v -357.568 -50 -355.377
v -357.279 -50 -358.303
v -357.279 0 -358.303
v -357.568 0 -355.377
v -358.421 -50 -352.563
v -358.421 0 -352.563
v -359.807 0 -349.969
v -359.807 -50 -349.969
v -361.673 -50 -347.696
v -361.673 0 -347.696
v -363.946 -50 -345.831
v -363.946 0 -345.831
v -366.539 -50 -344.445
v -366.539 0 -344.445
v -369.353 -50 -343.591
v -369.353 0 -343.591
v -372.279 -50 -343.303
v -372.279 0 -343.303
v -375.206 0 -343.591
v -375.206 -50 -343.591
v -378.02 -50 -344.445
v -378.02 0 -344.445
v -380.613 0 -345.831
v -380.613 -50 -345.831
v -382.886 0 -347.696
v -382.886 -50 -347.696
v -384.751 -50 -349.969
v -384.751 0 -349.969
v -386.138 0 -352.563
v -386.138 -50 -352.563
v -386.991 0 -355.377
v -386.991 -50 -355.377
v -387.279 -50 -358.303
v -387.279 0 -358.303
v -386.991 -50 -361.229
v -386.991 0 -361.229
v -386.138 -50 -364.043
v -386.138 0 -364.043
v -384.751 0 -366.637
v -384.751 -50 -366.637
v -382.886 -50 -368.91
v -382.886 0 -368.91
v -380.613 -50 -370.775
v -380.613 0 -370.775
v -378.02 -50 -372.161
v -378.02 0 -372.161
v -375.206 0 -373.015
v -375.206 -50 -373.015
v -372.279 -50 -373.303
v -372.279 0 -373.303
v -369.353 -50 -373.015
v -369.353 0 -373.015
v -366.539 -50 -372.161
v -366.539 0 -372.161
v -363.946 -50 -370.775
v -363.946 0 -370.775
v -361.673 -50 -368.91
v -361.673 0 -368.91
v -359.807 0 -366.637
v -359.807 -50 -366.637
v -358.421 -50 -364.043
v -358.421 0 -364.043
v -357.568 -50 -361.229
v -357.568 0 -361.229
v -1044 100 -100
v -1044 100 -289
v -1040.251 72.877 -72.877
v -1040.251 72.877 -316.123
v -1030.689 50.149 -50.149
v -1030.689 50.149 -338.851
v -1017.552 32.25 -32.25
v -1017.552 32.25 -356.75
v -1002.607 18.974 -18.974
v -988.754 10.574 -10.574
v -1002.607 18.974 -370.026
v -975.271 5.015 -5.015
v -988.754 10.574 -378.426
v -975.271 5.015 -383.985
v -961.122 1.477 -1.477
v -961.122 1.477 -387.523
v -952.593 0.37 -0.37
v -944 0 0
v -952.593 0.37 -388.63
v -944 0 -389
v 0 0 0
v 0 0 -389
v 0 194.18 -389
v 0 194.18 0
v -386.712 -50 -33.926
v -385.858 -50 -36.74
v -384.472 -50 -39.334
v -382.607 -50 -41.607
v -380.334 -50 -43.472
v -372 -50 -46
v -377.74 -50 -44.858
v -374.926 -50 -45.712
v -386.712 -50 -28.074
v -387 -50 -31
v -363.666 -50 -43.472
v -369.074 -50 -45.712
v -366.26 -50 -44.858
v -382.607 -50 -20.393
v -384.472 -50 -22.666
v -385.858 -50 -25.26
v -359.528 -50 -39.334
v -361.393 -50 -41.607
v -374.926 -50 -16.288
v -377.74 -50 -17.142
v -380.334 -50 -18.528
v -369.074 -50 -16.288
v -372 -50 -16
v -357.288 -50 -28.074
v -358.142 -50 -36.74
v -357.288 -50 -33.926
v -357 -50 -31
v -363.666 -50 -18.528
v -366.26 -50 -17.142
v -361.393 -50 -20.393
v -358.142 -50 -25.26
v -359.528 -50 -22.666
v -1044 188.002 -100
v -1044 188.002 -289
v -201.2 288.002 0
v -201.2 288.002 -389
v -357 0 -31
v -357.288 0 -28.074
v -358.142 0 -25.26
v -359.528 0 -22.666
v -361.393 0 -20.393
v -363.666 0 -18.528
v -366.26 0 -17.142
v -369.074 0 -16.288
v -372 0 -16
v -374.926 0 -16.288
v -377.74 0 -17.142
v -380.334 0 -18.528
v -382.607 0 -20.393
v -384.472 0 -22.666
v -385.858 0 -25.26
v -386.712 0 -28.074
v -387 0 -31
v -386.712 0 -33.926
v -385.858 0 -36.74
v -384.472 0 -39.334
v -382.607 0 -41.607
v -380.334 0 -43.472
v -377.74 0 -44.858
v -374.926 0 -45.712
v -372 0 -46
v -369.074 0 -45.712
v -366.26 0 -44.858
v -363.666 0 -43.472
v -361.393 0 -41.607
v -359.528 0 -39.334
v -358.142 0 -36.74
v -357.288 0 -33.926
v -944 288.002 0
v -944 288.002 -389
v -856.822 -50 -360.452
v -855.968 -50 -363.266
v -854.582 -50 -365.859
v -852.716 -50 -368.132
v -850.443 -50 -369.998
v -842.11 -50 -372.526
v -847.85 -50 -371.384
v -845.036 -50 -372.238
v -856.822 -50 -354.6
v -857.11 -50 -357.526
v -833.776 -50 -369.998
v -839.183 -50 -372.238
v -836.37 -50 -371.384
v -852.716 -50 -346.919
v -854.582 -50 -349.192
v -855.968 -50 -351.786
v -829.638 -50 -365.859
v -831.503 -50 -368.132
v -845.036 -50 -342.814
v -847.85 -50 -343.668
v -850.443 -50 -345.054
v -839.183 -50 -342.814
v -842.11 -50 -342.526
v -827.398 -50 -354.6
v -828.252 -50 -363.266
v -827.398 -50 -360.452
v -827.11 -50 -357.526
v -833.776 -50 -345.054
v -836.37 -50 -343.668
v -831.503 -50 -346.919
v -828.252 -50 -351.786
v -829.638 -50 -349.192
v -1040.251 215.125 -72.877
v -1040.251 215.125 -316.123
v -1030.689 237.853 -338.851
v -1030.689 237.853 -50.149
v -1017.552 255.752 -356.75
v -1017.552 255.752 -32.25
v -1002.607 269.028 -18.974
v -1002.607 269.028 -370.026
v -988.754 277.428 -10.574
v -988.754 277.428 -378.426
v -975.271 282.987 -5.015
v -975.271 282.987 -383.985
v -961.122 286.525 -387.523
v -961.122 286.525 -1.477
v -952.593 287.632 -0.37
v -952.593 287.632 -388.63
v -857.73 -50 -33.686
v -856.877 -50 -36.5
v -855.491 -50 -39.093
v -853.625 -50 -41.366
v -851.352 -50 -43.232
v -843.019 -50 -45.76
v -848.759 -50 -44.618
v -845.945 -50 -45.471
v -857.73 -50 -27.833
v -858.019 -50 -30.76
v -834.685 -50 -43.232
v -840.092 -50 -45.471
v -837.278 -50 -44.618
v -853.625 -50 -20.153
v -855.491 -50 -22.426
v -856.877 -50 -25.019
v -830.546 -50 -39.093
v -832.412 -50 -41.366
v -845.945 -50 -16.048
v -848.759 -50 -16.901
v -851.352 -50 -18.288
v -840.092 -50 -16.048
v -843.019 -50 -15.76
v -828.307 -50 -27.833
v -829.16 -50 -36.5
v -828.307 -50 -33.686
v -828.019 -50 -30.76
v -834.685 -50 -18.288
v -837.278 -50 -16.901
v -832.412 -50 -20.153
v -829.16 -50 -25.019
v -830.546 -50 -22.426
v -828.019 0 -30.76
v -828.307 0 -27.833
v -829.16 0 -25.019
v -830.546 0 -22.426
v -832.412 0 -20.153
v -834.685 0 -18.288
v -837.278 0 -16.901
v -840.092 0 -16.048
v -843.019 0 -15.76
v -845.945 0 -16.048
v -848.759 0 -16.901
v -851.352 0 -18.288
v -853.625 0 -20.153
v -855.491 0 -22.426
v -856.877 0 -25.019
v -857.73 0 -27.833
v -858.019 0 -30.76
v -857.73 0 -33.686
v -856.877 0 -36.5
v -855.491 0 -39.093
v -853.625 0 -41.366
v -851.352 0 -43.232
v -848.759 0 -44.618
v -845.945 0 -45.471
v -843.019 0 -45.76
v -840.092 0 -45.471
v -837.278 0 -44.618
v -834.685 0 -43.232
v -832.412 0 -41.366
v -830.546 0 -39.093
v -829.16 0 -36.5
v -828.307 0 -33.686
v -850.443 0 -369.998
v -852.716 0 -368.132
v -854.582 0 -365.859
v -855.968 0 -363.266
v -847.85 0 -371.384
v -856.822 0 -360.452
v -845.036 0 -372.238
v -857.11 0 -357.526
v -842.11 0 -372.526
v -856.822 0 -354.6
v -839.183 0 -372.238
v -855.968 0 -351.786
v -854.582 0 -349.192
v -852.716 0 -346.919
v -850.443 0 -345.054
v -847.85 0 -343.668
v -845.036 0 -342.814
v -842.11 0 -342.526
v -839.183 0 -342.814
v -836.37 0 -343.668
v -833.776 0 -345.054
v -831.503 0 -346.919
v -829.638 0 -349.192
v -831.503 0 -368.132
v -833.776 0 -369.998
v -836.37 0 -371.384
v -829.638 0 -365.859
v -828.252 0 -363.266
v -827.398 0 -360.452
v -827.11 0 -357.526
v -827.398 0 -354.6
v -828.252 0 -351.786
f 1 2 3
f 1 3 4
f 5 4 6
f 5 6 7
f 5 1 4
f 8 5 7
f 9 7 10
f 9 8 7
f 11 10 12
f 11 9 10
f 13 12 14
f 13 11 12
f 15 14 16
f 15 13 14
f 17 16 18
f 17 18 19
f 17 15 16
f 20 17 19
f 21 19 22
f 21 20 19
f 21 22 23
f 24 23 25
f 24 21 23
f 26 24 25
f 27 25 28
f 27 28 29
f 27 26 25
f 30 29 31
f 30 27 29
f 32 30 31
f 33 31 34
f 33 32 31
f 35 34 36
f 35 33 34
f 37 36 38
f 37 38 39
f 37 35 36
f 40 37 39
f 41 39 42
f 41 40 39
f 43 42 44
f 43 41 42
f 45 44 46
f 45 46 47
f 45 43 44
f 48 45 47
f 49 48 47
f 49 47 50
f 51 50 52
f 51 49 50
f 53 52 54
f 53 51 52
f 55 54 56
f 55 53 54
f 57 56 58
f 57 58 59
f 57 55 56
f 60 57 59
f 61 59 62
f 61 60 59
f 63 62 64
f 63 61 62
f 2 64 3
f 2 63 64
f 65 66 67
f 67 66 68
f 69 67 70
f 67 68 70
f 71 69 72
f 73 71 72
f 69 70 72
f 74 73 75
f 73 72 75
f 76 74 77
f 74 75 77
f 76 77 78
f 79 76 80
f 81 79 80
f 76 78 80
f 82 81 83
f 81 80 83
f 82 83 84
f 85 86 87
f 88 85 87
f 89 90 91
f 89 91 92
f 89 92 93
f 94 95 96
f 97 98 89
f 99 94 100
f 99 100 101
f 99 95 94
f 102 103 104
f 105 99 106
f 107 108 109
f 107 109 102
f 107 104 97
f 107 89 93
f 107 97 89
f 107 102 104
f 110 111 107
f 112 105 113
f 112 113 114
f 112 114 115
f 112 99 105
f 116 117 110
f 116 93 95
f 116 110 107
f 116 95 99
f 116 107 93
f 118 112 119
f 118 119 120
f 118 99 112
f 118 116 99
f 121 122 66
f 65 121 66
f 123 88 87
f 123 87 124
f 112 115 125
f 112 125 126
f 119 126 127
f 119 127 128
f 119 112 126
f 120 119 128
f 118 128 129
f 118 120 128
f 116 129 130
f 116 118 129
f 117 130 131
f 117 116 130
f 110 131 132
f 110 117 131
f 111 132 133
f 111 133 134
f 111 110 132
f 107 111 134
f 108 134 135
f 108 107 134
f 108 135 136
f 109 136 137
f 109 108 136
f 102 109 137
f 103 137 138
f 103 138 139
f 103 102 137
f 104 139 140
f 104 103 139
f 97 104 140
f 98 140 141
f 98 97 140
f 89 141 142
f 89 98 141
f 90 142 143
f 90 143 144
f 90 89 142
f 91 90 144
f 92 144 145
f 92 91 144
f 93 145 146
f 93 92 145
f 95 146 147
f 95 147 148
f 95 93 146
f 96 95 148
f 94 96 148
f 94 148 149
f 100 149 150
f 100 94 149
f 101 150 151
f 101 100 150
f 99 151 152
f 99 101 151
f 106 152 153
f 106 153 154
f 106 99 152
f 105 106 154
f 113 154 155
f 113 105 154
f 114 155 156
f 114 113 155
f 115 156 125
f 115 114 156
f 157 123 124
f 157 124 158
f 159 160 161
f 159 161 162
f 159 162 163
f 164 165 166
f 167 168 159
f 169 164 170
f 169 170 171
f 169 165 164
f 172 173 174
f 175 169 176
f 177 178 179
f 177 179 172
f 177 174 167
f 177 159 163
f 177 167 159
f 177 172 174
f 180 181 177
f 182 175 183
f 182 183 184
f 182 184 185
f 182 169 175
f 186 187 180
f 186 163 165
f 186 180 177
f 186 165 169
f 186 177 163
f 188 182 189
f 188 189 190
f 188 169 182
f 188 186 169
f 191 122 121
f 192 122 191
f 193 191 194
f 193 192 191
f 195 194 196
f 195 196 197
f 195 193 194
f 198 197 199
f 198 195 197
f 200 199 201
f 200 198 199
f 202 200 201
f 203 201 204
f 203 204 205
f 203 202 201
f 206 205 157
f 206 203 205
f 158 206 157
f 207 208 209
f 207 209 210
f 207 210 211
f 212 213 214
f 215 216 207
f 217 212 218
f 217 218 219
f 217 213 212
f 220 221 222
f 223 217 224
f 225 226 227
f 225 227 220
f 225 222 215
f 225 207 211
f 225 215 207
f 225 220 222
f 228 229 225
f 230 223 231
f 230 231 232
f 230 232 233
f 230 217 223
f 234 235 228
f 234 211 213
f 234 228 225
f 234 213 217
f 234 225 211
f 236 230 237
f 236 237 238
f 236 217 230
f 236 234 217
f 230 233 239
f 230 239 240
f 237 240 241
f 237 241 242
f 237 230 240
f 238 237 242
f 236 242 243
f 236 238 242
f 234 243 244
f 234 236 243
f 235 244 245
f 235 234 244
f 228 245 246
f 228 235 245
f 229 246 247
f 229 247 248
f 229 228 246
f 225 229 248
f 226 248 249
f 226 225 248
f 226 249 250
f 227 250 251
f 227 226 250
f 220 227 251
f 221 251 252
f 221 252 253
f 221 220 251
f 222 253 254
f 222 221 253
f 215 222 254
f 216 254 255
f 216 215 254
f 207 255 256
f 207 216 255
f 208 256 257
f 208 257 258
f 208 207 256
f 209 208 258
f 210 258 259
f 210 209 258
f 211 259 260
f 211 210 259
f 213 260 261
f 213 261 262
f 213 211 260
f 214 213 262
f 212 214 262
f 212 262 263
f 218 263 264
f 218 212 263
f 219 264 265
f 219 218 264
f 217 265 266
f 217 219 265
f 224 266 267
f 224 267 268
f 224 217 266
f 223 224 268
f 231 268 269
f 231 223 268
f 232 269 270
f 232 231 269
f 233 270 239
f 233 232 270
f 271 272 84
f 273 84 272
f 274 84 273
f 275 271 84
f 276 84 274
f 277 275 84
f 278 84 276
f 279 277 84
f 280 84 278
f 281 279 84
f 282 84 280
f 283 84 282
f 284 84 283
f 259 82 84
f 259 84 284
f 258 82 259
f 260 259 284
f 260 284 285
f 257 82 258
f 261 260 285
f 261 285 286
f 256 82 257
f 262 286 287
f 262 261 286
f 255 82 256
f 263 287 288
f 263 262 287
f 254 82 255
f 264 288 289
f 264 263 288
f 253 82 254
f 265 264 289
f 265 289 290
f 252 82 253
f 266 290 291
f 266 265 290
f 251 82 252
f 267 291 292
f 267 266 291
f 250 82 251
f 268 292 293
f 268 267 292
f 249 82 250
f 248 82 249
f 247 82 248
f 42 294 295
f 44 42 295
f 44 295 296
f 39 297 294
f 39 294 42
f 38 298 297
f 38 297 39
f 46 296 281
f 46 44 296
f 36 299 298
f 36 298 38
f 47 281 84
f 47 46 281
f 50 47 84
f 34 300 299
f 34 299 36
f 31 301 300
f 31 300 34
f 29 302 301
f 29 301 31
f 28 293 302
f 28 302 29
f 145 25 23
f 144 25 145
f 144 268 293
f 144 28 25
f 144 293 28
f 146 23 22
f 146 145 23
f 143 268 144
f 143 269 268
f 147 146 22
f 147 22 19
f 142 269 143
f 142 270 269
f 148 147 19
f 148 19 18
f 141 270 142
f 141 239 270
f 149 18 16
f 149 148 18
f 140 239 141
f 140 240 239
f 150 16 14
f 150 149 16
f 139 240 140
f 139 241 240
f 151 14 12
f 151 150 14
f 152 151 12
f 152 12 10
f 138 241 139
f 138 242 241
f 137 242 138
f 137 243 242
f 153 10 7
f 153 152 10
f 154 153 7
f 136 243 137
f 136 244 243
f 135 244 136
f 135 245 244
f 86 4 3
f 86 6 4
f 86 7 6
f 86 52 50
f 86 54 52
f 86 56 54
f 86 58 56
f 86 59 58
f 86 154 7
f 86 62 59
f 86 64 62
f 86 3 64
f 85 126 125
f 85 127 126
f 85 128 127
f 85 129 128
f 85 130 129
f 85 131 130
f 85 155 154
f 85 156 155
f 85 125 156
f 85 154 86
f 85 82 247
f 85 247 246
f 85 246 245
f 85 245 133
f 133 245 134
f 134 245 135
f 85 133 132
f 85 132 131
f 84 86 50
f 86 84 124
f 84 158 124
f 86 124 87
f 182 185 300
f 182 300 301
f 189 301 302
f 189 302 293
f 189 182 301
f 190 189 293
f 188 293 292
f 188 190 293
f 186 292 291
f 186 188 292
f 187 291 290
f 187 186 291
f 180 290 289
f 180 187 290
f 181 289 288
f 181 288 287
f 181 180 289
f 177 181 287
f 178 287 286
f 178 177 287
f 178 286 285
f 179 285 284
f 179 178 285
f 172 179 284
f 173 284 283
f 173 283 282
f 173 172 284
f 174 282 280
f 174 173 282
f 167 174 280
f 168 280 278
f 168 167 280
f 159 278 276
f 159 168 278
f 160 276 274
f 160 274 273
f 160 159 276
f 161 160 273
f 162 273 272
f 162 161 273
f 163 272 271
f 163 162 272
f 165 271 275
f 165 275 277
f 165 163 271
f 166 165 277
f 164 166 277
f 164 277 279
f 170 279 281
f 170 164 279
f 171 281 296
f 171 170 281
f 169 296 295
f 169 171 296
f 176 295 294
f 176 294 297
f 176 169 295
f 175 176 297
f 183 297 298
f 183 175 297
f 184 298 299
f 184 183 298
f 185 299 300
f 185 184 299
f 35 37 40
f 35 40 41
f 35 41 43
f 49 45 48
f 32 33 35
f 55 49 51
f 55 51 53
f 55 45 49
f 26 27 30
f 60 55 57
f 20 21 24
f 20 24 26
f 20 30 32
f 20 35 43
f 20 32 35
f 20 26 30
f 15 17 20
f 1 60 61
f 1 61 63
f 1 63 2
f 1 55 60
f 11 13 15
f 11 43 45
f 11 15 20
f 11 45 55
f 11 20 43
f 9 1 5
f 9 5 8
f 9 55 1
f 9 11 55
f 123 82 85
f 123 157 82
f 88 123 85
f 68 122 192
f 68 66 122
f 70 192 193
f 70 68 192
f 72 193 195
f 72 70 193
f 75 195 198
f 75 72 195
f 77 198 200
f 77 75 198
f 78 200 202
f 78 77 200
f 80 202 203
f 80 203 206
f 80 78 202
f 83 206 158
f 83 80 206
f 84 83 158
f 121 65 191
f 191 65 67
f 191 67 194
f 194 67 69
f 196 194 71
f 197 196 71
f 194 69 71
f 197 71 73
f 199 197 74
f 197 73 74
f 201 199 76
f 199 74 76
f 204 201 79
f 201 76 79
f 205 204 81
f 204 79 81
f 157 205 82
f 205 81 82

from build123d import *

# Parameters (mm, degrees)
F1_DEPTH = 389
F2_R     = 100
F7_R     = 15
F8_DEPTH = 50
F5_R     = 15
F4_R     = 15
F6_R     = 15
F9_DEPTH = 50


with BuildPart() as f1:
    # F0 (on Top) → F1 (new body)
    with BuildSketch(Plane.XY):
        Polygon((-1044, 288.001959), (-1044, 0), (0, 0), (0, 194.18), (-201.2, 288.001959), align=None)
    extrude(amount=-F1_DEPTH)

    # F2
    f2_edges = [f1.edges().sort_by_distance(p)[0] for p in [
        (-1044, 288.001959, -194.5),
        (-1044, 0, -194.5),
        (-1044, 144.00098, 0),
        (-1044, 144.00098, -389),
    ]]
    fillet(f2_edges, radius=F2_R)

    # F7 (on offset) → F8 (join)
    with BuildSketch(Plane.XZ.offset(50)):
        with Locations((-842.109799, -357.525885)):
            Circle(F7_R)
    extrude(amount=-F8_DEPTH)

    # F5 (on offset) + F4 (on offset) + F6 (on offset) → F9 (join)
    with BuildSketch(Plane.XZ.offset(50)):
        with Locations((-372.279406, -358.30304)):
            Circle(F5_R)
    with BuildSketch(Plane.XZ.offset(50)):
        with Locations((-372, -31)):
            Circle(F4_R)
    with BuildSketch(Plane.XZ.offset(50)):
        with Locations((-843.018532, -30.759659)):
            Circle(F6_R)
    extrude(amount=-F9_DEPTH)


solid = f1.part
